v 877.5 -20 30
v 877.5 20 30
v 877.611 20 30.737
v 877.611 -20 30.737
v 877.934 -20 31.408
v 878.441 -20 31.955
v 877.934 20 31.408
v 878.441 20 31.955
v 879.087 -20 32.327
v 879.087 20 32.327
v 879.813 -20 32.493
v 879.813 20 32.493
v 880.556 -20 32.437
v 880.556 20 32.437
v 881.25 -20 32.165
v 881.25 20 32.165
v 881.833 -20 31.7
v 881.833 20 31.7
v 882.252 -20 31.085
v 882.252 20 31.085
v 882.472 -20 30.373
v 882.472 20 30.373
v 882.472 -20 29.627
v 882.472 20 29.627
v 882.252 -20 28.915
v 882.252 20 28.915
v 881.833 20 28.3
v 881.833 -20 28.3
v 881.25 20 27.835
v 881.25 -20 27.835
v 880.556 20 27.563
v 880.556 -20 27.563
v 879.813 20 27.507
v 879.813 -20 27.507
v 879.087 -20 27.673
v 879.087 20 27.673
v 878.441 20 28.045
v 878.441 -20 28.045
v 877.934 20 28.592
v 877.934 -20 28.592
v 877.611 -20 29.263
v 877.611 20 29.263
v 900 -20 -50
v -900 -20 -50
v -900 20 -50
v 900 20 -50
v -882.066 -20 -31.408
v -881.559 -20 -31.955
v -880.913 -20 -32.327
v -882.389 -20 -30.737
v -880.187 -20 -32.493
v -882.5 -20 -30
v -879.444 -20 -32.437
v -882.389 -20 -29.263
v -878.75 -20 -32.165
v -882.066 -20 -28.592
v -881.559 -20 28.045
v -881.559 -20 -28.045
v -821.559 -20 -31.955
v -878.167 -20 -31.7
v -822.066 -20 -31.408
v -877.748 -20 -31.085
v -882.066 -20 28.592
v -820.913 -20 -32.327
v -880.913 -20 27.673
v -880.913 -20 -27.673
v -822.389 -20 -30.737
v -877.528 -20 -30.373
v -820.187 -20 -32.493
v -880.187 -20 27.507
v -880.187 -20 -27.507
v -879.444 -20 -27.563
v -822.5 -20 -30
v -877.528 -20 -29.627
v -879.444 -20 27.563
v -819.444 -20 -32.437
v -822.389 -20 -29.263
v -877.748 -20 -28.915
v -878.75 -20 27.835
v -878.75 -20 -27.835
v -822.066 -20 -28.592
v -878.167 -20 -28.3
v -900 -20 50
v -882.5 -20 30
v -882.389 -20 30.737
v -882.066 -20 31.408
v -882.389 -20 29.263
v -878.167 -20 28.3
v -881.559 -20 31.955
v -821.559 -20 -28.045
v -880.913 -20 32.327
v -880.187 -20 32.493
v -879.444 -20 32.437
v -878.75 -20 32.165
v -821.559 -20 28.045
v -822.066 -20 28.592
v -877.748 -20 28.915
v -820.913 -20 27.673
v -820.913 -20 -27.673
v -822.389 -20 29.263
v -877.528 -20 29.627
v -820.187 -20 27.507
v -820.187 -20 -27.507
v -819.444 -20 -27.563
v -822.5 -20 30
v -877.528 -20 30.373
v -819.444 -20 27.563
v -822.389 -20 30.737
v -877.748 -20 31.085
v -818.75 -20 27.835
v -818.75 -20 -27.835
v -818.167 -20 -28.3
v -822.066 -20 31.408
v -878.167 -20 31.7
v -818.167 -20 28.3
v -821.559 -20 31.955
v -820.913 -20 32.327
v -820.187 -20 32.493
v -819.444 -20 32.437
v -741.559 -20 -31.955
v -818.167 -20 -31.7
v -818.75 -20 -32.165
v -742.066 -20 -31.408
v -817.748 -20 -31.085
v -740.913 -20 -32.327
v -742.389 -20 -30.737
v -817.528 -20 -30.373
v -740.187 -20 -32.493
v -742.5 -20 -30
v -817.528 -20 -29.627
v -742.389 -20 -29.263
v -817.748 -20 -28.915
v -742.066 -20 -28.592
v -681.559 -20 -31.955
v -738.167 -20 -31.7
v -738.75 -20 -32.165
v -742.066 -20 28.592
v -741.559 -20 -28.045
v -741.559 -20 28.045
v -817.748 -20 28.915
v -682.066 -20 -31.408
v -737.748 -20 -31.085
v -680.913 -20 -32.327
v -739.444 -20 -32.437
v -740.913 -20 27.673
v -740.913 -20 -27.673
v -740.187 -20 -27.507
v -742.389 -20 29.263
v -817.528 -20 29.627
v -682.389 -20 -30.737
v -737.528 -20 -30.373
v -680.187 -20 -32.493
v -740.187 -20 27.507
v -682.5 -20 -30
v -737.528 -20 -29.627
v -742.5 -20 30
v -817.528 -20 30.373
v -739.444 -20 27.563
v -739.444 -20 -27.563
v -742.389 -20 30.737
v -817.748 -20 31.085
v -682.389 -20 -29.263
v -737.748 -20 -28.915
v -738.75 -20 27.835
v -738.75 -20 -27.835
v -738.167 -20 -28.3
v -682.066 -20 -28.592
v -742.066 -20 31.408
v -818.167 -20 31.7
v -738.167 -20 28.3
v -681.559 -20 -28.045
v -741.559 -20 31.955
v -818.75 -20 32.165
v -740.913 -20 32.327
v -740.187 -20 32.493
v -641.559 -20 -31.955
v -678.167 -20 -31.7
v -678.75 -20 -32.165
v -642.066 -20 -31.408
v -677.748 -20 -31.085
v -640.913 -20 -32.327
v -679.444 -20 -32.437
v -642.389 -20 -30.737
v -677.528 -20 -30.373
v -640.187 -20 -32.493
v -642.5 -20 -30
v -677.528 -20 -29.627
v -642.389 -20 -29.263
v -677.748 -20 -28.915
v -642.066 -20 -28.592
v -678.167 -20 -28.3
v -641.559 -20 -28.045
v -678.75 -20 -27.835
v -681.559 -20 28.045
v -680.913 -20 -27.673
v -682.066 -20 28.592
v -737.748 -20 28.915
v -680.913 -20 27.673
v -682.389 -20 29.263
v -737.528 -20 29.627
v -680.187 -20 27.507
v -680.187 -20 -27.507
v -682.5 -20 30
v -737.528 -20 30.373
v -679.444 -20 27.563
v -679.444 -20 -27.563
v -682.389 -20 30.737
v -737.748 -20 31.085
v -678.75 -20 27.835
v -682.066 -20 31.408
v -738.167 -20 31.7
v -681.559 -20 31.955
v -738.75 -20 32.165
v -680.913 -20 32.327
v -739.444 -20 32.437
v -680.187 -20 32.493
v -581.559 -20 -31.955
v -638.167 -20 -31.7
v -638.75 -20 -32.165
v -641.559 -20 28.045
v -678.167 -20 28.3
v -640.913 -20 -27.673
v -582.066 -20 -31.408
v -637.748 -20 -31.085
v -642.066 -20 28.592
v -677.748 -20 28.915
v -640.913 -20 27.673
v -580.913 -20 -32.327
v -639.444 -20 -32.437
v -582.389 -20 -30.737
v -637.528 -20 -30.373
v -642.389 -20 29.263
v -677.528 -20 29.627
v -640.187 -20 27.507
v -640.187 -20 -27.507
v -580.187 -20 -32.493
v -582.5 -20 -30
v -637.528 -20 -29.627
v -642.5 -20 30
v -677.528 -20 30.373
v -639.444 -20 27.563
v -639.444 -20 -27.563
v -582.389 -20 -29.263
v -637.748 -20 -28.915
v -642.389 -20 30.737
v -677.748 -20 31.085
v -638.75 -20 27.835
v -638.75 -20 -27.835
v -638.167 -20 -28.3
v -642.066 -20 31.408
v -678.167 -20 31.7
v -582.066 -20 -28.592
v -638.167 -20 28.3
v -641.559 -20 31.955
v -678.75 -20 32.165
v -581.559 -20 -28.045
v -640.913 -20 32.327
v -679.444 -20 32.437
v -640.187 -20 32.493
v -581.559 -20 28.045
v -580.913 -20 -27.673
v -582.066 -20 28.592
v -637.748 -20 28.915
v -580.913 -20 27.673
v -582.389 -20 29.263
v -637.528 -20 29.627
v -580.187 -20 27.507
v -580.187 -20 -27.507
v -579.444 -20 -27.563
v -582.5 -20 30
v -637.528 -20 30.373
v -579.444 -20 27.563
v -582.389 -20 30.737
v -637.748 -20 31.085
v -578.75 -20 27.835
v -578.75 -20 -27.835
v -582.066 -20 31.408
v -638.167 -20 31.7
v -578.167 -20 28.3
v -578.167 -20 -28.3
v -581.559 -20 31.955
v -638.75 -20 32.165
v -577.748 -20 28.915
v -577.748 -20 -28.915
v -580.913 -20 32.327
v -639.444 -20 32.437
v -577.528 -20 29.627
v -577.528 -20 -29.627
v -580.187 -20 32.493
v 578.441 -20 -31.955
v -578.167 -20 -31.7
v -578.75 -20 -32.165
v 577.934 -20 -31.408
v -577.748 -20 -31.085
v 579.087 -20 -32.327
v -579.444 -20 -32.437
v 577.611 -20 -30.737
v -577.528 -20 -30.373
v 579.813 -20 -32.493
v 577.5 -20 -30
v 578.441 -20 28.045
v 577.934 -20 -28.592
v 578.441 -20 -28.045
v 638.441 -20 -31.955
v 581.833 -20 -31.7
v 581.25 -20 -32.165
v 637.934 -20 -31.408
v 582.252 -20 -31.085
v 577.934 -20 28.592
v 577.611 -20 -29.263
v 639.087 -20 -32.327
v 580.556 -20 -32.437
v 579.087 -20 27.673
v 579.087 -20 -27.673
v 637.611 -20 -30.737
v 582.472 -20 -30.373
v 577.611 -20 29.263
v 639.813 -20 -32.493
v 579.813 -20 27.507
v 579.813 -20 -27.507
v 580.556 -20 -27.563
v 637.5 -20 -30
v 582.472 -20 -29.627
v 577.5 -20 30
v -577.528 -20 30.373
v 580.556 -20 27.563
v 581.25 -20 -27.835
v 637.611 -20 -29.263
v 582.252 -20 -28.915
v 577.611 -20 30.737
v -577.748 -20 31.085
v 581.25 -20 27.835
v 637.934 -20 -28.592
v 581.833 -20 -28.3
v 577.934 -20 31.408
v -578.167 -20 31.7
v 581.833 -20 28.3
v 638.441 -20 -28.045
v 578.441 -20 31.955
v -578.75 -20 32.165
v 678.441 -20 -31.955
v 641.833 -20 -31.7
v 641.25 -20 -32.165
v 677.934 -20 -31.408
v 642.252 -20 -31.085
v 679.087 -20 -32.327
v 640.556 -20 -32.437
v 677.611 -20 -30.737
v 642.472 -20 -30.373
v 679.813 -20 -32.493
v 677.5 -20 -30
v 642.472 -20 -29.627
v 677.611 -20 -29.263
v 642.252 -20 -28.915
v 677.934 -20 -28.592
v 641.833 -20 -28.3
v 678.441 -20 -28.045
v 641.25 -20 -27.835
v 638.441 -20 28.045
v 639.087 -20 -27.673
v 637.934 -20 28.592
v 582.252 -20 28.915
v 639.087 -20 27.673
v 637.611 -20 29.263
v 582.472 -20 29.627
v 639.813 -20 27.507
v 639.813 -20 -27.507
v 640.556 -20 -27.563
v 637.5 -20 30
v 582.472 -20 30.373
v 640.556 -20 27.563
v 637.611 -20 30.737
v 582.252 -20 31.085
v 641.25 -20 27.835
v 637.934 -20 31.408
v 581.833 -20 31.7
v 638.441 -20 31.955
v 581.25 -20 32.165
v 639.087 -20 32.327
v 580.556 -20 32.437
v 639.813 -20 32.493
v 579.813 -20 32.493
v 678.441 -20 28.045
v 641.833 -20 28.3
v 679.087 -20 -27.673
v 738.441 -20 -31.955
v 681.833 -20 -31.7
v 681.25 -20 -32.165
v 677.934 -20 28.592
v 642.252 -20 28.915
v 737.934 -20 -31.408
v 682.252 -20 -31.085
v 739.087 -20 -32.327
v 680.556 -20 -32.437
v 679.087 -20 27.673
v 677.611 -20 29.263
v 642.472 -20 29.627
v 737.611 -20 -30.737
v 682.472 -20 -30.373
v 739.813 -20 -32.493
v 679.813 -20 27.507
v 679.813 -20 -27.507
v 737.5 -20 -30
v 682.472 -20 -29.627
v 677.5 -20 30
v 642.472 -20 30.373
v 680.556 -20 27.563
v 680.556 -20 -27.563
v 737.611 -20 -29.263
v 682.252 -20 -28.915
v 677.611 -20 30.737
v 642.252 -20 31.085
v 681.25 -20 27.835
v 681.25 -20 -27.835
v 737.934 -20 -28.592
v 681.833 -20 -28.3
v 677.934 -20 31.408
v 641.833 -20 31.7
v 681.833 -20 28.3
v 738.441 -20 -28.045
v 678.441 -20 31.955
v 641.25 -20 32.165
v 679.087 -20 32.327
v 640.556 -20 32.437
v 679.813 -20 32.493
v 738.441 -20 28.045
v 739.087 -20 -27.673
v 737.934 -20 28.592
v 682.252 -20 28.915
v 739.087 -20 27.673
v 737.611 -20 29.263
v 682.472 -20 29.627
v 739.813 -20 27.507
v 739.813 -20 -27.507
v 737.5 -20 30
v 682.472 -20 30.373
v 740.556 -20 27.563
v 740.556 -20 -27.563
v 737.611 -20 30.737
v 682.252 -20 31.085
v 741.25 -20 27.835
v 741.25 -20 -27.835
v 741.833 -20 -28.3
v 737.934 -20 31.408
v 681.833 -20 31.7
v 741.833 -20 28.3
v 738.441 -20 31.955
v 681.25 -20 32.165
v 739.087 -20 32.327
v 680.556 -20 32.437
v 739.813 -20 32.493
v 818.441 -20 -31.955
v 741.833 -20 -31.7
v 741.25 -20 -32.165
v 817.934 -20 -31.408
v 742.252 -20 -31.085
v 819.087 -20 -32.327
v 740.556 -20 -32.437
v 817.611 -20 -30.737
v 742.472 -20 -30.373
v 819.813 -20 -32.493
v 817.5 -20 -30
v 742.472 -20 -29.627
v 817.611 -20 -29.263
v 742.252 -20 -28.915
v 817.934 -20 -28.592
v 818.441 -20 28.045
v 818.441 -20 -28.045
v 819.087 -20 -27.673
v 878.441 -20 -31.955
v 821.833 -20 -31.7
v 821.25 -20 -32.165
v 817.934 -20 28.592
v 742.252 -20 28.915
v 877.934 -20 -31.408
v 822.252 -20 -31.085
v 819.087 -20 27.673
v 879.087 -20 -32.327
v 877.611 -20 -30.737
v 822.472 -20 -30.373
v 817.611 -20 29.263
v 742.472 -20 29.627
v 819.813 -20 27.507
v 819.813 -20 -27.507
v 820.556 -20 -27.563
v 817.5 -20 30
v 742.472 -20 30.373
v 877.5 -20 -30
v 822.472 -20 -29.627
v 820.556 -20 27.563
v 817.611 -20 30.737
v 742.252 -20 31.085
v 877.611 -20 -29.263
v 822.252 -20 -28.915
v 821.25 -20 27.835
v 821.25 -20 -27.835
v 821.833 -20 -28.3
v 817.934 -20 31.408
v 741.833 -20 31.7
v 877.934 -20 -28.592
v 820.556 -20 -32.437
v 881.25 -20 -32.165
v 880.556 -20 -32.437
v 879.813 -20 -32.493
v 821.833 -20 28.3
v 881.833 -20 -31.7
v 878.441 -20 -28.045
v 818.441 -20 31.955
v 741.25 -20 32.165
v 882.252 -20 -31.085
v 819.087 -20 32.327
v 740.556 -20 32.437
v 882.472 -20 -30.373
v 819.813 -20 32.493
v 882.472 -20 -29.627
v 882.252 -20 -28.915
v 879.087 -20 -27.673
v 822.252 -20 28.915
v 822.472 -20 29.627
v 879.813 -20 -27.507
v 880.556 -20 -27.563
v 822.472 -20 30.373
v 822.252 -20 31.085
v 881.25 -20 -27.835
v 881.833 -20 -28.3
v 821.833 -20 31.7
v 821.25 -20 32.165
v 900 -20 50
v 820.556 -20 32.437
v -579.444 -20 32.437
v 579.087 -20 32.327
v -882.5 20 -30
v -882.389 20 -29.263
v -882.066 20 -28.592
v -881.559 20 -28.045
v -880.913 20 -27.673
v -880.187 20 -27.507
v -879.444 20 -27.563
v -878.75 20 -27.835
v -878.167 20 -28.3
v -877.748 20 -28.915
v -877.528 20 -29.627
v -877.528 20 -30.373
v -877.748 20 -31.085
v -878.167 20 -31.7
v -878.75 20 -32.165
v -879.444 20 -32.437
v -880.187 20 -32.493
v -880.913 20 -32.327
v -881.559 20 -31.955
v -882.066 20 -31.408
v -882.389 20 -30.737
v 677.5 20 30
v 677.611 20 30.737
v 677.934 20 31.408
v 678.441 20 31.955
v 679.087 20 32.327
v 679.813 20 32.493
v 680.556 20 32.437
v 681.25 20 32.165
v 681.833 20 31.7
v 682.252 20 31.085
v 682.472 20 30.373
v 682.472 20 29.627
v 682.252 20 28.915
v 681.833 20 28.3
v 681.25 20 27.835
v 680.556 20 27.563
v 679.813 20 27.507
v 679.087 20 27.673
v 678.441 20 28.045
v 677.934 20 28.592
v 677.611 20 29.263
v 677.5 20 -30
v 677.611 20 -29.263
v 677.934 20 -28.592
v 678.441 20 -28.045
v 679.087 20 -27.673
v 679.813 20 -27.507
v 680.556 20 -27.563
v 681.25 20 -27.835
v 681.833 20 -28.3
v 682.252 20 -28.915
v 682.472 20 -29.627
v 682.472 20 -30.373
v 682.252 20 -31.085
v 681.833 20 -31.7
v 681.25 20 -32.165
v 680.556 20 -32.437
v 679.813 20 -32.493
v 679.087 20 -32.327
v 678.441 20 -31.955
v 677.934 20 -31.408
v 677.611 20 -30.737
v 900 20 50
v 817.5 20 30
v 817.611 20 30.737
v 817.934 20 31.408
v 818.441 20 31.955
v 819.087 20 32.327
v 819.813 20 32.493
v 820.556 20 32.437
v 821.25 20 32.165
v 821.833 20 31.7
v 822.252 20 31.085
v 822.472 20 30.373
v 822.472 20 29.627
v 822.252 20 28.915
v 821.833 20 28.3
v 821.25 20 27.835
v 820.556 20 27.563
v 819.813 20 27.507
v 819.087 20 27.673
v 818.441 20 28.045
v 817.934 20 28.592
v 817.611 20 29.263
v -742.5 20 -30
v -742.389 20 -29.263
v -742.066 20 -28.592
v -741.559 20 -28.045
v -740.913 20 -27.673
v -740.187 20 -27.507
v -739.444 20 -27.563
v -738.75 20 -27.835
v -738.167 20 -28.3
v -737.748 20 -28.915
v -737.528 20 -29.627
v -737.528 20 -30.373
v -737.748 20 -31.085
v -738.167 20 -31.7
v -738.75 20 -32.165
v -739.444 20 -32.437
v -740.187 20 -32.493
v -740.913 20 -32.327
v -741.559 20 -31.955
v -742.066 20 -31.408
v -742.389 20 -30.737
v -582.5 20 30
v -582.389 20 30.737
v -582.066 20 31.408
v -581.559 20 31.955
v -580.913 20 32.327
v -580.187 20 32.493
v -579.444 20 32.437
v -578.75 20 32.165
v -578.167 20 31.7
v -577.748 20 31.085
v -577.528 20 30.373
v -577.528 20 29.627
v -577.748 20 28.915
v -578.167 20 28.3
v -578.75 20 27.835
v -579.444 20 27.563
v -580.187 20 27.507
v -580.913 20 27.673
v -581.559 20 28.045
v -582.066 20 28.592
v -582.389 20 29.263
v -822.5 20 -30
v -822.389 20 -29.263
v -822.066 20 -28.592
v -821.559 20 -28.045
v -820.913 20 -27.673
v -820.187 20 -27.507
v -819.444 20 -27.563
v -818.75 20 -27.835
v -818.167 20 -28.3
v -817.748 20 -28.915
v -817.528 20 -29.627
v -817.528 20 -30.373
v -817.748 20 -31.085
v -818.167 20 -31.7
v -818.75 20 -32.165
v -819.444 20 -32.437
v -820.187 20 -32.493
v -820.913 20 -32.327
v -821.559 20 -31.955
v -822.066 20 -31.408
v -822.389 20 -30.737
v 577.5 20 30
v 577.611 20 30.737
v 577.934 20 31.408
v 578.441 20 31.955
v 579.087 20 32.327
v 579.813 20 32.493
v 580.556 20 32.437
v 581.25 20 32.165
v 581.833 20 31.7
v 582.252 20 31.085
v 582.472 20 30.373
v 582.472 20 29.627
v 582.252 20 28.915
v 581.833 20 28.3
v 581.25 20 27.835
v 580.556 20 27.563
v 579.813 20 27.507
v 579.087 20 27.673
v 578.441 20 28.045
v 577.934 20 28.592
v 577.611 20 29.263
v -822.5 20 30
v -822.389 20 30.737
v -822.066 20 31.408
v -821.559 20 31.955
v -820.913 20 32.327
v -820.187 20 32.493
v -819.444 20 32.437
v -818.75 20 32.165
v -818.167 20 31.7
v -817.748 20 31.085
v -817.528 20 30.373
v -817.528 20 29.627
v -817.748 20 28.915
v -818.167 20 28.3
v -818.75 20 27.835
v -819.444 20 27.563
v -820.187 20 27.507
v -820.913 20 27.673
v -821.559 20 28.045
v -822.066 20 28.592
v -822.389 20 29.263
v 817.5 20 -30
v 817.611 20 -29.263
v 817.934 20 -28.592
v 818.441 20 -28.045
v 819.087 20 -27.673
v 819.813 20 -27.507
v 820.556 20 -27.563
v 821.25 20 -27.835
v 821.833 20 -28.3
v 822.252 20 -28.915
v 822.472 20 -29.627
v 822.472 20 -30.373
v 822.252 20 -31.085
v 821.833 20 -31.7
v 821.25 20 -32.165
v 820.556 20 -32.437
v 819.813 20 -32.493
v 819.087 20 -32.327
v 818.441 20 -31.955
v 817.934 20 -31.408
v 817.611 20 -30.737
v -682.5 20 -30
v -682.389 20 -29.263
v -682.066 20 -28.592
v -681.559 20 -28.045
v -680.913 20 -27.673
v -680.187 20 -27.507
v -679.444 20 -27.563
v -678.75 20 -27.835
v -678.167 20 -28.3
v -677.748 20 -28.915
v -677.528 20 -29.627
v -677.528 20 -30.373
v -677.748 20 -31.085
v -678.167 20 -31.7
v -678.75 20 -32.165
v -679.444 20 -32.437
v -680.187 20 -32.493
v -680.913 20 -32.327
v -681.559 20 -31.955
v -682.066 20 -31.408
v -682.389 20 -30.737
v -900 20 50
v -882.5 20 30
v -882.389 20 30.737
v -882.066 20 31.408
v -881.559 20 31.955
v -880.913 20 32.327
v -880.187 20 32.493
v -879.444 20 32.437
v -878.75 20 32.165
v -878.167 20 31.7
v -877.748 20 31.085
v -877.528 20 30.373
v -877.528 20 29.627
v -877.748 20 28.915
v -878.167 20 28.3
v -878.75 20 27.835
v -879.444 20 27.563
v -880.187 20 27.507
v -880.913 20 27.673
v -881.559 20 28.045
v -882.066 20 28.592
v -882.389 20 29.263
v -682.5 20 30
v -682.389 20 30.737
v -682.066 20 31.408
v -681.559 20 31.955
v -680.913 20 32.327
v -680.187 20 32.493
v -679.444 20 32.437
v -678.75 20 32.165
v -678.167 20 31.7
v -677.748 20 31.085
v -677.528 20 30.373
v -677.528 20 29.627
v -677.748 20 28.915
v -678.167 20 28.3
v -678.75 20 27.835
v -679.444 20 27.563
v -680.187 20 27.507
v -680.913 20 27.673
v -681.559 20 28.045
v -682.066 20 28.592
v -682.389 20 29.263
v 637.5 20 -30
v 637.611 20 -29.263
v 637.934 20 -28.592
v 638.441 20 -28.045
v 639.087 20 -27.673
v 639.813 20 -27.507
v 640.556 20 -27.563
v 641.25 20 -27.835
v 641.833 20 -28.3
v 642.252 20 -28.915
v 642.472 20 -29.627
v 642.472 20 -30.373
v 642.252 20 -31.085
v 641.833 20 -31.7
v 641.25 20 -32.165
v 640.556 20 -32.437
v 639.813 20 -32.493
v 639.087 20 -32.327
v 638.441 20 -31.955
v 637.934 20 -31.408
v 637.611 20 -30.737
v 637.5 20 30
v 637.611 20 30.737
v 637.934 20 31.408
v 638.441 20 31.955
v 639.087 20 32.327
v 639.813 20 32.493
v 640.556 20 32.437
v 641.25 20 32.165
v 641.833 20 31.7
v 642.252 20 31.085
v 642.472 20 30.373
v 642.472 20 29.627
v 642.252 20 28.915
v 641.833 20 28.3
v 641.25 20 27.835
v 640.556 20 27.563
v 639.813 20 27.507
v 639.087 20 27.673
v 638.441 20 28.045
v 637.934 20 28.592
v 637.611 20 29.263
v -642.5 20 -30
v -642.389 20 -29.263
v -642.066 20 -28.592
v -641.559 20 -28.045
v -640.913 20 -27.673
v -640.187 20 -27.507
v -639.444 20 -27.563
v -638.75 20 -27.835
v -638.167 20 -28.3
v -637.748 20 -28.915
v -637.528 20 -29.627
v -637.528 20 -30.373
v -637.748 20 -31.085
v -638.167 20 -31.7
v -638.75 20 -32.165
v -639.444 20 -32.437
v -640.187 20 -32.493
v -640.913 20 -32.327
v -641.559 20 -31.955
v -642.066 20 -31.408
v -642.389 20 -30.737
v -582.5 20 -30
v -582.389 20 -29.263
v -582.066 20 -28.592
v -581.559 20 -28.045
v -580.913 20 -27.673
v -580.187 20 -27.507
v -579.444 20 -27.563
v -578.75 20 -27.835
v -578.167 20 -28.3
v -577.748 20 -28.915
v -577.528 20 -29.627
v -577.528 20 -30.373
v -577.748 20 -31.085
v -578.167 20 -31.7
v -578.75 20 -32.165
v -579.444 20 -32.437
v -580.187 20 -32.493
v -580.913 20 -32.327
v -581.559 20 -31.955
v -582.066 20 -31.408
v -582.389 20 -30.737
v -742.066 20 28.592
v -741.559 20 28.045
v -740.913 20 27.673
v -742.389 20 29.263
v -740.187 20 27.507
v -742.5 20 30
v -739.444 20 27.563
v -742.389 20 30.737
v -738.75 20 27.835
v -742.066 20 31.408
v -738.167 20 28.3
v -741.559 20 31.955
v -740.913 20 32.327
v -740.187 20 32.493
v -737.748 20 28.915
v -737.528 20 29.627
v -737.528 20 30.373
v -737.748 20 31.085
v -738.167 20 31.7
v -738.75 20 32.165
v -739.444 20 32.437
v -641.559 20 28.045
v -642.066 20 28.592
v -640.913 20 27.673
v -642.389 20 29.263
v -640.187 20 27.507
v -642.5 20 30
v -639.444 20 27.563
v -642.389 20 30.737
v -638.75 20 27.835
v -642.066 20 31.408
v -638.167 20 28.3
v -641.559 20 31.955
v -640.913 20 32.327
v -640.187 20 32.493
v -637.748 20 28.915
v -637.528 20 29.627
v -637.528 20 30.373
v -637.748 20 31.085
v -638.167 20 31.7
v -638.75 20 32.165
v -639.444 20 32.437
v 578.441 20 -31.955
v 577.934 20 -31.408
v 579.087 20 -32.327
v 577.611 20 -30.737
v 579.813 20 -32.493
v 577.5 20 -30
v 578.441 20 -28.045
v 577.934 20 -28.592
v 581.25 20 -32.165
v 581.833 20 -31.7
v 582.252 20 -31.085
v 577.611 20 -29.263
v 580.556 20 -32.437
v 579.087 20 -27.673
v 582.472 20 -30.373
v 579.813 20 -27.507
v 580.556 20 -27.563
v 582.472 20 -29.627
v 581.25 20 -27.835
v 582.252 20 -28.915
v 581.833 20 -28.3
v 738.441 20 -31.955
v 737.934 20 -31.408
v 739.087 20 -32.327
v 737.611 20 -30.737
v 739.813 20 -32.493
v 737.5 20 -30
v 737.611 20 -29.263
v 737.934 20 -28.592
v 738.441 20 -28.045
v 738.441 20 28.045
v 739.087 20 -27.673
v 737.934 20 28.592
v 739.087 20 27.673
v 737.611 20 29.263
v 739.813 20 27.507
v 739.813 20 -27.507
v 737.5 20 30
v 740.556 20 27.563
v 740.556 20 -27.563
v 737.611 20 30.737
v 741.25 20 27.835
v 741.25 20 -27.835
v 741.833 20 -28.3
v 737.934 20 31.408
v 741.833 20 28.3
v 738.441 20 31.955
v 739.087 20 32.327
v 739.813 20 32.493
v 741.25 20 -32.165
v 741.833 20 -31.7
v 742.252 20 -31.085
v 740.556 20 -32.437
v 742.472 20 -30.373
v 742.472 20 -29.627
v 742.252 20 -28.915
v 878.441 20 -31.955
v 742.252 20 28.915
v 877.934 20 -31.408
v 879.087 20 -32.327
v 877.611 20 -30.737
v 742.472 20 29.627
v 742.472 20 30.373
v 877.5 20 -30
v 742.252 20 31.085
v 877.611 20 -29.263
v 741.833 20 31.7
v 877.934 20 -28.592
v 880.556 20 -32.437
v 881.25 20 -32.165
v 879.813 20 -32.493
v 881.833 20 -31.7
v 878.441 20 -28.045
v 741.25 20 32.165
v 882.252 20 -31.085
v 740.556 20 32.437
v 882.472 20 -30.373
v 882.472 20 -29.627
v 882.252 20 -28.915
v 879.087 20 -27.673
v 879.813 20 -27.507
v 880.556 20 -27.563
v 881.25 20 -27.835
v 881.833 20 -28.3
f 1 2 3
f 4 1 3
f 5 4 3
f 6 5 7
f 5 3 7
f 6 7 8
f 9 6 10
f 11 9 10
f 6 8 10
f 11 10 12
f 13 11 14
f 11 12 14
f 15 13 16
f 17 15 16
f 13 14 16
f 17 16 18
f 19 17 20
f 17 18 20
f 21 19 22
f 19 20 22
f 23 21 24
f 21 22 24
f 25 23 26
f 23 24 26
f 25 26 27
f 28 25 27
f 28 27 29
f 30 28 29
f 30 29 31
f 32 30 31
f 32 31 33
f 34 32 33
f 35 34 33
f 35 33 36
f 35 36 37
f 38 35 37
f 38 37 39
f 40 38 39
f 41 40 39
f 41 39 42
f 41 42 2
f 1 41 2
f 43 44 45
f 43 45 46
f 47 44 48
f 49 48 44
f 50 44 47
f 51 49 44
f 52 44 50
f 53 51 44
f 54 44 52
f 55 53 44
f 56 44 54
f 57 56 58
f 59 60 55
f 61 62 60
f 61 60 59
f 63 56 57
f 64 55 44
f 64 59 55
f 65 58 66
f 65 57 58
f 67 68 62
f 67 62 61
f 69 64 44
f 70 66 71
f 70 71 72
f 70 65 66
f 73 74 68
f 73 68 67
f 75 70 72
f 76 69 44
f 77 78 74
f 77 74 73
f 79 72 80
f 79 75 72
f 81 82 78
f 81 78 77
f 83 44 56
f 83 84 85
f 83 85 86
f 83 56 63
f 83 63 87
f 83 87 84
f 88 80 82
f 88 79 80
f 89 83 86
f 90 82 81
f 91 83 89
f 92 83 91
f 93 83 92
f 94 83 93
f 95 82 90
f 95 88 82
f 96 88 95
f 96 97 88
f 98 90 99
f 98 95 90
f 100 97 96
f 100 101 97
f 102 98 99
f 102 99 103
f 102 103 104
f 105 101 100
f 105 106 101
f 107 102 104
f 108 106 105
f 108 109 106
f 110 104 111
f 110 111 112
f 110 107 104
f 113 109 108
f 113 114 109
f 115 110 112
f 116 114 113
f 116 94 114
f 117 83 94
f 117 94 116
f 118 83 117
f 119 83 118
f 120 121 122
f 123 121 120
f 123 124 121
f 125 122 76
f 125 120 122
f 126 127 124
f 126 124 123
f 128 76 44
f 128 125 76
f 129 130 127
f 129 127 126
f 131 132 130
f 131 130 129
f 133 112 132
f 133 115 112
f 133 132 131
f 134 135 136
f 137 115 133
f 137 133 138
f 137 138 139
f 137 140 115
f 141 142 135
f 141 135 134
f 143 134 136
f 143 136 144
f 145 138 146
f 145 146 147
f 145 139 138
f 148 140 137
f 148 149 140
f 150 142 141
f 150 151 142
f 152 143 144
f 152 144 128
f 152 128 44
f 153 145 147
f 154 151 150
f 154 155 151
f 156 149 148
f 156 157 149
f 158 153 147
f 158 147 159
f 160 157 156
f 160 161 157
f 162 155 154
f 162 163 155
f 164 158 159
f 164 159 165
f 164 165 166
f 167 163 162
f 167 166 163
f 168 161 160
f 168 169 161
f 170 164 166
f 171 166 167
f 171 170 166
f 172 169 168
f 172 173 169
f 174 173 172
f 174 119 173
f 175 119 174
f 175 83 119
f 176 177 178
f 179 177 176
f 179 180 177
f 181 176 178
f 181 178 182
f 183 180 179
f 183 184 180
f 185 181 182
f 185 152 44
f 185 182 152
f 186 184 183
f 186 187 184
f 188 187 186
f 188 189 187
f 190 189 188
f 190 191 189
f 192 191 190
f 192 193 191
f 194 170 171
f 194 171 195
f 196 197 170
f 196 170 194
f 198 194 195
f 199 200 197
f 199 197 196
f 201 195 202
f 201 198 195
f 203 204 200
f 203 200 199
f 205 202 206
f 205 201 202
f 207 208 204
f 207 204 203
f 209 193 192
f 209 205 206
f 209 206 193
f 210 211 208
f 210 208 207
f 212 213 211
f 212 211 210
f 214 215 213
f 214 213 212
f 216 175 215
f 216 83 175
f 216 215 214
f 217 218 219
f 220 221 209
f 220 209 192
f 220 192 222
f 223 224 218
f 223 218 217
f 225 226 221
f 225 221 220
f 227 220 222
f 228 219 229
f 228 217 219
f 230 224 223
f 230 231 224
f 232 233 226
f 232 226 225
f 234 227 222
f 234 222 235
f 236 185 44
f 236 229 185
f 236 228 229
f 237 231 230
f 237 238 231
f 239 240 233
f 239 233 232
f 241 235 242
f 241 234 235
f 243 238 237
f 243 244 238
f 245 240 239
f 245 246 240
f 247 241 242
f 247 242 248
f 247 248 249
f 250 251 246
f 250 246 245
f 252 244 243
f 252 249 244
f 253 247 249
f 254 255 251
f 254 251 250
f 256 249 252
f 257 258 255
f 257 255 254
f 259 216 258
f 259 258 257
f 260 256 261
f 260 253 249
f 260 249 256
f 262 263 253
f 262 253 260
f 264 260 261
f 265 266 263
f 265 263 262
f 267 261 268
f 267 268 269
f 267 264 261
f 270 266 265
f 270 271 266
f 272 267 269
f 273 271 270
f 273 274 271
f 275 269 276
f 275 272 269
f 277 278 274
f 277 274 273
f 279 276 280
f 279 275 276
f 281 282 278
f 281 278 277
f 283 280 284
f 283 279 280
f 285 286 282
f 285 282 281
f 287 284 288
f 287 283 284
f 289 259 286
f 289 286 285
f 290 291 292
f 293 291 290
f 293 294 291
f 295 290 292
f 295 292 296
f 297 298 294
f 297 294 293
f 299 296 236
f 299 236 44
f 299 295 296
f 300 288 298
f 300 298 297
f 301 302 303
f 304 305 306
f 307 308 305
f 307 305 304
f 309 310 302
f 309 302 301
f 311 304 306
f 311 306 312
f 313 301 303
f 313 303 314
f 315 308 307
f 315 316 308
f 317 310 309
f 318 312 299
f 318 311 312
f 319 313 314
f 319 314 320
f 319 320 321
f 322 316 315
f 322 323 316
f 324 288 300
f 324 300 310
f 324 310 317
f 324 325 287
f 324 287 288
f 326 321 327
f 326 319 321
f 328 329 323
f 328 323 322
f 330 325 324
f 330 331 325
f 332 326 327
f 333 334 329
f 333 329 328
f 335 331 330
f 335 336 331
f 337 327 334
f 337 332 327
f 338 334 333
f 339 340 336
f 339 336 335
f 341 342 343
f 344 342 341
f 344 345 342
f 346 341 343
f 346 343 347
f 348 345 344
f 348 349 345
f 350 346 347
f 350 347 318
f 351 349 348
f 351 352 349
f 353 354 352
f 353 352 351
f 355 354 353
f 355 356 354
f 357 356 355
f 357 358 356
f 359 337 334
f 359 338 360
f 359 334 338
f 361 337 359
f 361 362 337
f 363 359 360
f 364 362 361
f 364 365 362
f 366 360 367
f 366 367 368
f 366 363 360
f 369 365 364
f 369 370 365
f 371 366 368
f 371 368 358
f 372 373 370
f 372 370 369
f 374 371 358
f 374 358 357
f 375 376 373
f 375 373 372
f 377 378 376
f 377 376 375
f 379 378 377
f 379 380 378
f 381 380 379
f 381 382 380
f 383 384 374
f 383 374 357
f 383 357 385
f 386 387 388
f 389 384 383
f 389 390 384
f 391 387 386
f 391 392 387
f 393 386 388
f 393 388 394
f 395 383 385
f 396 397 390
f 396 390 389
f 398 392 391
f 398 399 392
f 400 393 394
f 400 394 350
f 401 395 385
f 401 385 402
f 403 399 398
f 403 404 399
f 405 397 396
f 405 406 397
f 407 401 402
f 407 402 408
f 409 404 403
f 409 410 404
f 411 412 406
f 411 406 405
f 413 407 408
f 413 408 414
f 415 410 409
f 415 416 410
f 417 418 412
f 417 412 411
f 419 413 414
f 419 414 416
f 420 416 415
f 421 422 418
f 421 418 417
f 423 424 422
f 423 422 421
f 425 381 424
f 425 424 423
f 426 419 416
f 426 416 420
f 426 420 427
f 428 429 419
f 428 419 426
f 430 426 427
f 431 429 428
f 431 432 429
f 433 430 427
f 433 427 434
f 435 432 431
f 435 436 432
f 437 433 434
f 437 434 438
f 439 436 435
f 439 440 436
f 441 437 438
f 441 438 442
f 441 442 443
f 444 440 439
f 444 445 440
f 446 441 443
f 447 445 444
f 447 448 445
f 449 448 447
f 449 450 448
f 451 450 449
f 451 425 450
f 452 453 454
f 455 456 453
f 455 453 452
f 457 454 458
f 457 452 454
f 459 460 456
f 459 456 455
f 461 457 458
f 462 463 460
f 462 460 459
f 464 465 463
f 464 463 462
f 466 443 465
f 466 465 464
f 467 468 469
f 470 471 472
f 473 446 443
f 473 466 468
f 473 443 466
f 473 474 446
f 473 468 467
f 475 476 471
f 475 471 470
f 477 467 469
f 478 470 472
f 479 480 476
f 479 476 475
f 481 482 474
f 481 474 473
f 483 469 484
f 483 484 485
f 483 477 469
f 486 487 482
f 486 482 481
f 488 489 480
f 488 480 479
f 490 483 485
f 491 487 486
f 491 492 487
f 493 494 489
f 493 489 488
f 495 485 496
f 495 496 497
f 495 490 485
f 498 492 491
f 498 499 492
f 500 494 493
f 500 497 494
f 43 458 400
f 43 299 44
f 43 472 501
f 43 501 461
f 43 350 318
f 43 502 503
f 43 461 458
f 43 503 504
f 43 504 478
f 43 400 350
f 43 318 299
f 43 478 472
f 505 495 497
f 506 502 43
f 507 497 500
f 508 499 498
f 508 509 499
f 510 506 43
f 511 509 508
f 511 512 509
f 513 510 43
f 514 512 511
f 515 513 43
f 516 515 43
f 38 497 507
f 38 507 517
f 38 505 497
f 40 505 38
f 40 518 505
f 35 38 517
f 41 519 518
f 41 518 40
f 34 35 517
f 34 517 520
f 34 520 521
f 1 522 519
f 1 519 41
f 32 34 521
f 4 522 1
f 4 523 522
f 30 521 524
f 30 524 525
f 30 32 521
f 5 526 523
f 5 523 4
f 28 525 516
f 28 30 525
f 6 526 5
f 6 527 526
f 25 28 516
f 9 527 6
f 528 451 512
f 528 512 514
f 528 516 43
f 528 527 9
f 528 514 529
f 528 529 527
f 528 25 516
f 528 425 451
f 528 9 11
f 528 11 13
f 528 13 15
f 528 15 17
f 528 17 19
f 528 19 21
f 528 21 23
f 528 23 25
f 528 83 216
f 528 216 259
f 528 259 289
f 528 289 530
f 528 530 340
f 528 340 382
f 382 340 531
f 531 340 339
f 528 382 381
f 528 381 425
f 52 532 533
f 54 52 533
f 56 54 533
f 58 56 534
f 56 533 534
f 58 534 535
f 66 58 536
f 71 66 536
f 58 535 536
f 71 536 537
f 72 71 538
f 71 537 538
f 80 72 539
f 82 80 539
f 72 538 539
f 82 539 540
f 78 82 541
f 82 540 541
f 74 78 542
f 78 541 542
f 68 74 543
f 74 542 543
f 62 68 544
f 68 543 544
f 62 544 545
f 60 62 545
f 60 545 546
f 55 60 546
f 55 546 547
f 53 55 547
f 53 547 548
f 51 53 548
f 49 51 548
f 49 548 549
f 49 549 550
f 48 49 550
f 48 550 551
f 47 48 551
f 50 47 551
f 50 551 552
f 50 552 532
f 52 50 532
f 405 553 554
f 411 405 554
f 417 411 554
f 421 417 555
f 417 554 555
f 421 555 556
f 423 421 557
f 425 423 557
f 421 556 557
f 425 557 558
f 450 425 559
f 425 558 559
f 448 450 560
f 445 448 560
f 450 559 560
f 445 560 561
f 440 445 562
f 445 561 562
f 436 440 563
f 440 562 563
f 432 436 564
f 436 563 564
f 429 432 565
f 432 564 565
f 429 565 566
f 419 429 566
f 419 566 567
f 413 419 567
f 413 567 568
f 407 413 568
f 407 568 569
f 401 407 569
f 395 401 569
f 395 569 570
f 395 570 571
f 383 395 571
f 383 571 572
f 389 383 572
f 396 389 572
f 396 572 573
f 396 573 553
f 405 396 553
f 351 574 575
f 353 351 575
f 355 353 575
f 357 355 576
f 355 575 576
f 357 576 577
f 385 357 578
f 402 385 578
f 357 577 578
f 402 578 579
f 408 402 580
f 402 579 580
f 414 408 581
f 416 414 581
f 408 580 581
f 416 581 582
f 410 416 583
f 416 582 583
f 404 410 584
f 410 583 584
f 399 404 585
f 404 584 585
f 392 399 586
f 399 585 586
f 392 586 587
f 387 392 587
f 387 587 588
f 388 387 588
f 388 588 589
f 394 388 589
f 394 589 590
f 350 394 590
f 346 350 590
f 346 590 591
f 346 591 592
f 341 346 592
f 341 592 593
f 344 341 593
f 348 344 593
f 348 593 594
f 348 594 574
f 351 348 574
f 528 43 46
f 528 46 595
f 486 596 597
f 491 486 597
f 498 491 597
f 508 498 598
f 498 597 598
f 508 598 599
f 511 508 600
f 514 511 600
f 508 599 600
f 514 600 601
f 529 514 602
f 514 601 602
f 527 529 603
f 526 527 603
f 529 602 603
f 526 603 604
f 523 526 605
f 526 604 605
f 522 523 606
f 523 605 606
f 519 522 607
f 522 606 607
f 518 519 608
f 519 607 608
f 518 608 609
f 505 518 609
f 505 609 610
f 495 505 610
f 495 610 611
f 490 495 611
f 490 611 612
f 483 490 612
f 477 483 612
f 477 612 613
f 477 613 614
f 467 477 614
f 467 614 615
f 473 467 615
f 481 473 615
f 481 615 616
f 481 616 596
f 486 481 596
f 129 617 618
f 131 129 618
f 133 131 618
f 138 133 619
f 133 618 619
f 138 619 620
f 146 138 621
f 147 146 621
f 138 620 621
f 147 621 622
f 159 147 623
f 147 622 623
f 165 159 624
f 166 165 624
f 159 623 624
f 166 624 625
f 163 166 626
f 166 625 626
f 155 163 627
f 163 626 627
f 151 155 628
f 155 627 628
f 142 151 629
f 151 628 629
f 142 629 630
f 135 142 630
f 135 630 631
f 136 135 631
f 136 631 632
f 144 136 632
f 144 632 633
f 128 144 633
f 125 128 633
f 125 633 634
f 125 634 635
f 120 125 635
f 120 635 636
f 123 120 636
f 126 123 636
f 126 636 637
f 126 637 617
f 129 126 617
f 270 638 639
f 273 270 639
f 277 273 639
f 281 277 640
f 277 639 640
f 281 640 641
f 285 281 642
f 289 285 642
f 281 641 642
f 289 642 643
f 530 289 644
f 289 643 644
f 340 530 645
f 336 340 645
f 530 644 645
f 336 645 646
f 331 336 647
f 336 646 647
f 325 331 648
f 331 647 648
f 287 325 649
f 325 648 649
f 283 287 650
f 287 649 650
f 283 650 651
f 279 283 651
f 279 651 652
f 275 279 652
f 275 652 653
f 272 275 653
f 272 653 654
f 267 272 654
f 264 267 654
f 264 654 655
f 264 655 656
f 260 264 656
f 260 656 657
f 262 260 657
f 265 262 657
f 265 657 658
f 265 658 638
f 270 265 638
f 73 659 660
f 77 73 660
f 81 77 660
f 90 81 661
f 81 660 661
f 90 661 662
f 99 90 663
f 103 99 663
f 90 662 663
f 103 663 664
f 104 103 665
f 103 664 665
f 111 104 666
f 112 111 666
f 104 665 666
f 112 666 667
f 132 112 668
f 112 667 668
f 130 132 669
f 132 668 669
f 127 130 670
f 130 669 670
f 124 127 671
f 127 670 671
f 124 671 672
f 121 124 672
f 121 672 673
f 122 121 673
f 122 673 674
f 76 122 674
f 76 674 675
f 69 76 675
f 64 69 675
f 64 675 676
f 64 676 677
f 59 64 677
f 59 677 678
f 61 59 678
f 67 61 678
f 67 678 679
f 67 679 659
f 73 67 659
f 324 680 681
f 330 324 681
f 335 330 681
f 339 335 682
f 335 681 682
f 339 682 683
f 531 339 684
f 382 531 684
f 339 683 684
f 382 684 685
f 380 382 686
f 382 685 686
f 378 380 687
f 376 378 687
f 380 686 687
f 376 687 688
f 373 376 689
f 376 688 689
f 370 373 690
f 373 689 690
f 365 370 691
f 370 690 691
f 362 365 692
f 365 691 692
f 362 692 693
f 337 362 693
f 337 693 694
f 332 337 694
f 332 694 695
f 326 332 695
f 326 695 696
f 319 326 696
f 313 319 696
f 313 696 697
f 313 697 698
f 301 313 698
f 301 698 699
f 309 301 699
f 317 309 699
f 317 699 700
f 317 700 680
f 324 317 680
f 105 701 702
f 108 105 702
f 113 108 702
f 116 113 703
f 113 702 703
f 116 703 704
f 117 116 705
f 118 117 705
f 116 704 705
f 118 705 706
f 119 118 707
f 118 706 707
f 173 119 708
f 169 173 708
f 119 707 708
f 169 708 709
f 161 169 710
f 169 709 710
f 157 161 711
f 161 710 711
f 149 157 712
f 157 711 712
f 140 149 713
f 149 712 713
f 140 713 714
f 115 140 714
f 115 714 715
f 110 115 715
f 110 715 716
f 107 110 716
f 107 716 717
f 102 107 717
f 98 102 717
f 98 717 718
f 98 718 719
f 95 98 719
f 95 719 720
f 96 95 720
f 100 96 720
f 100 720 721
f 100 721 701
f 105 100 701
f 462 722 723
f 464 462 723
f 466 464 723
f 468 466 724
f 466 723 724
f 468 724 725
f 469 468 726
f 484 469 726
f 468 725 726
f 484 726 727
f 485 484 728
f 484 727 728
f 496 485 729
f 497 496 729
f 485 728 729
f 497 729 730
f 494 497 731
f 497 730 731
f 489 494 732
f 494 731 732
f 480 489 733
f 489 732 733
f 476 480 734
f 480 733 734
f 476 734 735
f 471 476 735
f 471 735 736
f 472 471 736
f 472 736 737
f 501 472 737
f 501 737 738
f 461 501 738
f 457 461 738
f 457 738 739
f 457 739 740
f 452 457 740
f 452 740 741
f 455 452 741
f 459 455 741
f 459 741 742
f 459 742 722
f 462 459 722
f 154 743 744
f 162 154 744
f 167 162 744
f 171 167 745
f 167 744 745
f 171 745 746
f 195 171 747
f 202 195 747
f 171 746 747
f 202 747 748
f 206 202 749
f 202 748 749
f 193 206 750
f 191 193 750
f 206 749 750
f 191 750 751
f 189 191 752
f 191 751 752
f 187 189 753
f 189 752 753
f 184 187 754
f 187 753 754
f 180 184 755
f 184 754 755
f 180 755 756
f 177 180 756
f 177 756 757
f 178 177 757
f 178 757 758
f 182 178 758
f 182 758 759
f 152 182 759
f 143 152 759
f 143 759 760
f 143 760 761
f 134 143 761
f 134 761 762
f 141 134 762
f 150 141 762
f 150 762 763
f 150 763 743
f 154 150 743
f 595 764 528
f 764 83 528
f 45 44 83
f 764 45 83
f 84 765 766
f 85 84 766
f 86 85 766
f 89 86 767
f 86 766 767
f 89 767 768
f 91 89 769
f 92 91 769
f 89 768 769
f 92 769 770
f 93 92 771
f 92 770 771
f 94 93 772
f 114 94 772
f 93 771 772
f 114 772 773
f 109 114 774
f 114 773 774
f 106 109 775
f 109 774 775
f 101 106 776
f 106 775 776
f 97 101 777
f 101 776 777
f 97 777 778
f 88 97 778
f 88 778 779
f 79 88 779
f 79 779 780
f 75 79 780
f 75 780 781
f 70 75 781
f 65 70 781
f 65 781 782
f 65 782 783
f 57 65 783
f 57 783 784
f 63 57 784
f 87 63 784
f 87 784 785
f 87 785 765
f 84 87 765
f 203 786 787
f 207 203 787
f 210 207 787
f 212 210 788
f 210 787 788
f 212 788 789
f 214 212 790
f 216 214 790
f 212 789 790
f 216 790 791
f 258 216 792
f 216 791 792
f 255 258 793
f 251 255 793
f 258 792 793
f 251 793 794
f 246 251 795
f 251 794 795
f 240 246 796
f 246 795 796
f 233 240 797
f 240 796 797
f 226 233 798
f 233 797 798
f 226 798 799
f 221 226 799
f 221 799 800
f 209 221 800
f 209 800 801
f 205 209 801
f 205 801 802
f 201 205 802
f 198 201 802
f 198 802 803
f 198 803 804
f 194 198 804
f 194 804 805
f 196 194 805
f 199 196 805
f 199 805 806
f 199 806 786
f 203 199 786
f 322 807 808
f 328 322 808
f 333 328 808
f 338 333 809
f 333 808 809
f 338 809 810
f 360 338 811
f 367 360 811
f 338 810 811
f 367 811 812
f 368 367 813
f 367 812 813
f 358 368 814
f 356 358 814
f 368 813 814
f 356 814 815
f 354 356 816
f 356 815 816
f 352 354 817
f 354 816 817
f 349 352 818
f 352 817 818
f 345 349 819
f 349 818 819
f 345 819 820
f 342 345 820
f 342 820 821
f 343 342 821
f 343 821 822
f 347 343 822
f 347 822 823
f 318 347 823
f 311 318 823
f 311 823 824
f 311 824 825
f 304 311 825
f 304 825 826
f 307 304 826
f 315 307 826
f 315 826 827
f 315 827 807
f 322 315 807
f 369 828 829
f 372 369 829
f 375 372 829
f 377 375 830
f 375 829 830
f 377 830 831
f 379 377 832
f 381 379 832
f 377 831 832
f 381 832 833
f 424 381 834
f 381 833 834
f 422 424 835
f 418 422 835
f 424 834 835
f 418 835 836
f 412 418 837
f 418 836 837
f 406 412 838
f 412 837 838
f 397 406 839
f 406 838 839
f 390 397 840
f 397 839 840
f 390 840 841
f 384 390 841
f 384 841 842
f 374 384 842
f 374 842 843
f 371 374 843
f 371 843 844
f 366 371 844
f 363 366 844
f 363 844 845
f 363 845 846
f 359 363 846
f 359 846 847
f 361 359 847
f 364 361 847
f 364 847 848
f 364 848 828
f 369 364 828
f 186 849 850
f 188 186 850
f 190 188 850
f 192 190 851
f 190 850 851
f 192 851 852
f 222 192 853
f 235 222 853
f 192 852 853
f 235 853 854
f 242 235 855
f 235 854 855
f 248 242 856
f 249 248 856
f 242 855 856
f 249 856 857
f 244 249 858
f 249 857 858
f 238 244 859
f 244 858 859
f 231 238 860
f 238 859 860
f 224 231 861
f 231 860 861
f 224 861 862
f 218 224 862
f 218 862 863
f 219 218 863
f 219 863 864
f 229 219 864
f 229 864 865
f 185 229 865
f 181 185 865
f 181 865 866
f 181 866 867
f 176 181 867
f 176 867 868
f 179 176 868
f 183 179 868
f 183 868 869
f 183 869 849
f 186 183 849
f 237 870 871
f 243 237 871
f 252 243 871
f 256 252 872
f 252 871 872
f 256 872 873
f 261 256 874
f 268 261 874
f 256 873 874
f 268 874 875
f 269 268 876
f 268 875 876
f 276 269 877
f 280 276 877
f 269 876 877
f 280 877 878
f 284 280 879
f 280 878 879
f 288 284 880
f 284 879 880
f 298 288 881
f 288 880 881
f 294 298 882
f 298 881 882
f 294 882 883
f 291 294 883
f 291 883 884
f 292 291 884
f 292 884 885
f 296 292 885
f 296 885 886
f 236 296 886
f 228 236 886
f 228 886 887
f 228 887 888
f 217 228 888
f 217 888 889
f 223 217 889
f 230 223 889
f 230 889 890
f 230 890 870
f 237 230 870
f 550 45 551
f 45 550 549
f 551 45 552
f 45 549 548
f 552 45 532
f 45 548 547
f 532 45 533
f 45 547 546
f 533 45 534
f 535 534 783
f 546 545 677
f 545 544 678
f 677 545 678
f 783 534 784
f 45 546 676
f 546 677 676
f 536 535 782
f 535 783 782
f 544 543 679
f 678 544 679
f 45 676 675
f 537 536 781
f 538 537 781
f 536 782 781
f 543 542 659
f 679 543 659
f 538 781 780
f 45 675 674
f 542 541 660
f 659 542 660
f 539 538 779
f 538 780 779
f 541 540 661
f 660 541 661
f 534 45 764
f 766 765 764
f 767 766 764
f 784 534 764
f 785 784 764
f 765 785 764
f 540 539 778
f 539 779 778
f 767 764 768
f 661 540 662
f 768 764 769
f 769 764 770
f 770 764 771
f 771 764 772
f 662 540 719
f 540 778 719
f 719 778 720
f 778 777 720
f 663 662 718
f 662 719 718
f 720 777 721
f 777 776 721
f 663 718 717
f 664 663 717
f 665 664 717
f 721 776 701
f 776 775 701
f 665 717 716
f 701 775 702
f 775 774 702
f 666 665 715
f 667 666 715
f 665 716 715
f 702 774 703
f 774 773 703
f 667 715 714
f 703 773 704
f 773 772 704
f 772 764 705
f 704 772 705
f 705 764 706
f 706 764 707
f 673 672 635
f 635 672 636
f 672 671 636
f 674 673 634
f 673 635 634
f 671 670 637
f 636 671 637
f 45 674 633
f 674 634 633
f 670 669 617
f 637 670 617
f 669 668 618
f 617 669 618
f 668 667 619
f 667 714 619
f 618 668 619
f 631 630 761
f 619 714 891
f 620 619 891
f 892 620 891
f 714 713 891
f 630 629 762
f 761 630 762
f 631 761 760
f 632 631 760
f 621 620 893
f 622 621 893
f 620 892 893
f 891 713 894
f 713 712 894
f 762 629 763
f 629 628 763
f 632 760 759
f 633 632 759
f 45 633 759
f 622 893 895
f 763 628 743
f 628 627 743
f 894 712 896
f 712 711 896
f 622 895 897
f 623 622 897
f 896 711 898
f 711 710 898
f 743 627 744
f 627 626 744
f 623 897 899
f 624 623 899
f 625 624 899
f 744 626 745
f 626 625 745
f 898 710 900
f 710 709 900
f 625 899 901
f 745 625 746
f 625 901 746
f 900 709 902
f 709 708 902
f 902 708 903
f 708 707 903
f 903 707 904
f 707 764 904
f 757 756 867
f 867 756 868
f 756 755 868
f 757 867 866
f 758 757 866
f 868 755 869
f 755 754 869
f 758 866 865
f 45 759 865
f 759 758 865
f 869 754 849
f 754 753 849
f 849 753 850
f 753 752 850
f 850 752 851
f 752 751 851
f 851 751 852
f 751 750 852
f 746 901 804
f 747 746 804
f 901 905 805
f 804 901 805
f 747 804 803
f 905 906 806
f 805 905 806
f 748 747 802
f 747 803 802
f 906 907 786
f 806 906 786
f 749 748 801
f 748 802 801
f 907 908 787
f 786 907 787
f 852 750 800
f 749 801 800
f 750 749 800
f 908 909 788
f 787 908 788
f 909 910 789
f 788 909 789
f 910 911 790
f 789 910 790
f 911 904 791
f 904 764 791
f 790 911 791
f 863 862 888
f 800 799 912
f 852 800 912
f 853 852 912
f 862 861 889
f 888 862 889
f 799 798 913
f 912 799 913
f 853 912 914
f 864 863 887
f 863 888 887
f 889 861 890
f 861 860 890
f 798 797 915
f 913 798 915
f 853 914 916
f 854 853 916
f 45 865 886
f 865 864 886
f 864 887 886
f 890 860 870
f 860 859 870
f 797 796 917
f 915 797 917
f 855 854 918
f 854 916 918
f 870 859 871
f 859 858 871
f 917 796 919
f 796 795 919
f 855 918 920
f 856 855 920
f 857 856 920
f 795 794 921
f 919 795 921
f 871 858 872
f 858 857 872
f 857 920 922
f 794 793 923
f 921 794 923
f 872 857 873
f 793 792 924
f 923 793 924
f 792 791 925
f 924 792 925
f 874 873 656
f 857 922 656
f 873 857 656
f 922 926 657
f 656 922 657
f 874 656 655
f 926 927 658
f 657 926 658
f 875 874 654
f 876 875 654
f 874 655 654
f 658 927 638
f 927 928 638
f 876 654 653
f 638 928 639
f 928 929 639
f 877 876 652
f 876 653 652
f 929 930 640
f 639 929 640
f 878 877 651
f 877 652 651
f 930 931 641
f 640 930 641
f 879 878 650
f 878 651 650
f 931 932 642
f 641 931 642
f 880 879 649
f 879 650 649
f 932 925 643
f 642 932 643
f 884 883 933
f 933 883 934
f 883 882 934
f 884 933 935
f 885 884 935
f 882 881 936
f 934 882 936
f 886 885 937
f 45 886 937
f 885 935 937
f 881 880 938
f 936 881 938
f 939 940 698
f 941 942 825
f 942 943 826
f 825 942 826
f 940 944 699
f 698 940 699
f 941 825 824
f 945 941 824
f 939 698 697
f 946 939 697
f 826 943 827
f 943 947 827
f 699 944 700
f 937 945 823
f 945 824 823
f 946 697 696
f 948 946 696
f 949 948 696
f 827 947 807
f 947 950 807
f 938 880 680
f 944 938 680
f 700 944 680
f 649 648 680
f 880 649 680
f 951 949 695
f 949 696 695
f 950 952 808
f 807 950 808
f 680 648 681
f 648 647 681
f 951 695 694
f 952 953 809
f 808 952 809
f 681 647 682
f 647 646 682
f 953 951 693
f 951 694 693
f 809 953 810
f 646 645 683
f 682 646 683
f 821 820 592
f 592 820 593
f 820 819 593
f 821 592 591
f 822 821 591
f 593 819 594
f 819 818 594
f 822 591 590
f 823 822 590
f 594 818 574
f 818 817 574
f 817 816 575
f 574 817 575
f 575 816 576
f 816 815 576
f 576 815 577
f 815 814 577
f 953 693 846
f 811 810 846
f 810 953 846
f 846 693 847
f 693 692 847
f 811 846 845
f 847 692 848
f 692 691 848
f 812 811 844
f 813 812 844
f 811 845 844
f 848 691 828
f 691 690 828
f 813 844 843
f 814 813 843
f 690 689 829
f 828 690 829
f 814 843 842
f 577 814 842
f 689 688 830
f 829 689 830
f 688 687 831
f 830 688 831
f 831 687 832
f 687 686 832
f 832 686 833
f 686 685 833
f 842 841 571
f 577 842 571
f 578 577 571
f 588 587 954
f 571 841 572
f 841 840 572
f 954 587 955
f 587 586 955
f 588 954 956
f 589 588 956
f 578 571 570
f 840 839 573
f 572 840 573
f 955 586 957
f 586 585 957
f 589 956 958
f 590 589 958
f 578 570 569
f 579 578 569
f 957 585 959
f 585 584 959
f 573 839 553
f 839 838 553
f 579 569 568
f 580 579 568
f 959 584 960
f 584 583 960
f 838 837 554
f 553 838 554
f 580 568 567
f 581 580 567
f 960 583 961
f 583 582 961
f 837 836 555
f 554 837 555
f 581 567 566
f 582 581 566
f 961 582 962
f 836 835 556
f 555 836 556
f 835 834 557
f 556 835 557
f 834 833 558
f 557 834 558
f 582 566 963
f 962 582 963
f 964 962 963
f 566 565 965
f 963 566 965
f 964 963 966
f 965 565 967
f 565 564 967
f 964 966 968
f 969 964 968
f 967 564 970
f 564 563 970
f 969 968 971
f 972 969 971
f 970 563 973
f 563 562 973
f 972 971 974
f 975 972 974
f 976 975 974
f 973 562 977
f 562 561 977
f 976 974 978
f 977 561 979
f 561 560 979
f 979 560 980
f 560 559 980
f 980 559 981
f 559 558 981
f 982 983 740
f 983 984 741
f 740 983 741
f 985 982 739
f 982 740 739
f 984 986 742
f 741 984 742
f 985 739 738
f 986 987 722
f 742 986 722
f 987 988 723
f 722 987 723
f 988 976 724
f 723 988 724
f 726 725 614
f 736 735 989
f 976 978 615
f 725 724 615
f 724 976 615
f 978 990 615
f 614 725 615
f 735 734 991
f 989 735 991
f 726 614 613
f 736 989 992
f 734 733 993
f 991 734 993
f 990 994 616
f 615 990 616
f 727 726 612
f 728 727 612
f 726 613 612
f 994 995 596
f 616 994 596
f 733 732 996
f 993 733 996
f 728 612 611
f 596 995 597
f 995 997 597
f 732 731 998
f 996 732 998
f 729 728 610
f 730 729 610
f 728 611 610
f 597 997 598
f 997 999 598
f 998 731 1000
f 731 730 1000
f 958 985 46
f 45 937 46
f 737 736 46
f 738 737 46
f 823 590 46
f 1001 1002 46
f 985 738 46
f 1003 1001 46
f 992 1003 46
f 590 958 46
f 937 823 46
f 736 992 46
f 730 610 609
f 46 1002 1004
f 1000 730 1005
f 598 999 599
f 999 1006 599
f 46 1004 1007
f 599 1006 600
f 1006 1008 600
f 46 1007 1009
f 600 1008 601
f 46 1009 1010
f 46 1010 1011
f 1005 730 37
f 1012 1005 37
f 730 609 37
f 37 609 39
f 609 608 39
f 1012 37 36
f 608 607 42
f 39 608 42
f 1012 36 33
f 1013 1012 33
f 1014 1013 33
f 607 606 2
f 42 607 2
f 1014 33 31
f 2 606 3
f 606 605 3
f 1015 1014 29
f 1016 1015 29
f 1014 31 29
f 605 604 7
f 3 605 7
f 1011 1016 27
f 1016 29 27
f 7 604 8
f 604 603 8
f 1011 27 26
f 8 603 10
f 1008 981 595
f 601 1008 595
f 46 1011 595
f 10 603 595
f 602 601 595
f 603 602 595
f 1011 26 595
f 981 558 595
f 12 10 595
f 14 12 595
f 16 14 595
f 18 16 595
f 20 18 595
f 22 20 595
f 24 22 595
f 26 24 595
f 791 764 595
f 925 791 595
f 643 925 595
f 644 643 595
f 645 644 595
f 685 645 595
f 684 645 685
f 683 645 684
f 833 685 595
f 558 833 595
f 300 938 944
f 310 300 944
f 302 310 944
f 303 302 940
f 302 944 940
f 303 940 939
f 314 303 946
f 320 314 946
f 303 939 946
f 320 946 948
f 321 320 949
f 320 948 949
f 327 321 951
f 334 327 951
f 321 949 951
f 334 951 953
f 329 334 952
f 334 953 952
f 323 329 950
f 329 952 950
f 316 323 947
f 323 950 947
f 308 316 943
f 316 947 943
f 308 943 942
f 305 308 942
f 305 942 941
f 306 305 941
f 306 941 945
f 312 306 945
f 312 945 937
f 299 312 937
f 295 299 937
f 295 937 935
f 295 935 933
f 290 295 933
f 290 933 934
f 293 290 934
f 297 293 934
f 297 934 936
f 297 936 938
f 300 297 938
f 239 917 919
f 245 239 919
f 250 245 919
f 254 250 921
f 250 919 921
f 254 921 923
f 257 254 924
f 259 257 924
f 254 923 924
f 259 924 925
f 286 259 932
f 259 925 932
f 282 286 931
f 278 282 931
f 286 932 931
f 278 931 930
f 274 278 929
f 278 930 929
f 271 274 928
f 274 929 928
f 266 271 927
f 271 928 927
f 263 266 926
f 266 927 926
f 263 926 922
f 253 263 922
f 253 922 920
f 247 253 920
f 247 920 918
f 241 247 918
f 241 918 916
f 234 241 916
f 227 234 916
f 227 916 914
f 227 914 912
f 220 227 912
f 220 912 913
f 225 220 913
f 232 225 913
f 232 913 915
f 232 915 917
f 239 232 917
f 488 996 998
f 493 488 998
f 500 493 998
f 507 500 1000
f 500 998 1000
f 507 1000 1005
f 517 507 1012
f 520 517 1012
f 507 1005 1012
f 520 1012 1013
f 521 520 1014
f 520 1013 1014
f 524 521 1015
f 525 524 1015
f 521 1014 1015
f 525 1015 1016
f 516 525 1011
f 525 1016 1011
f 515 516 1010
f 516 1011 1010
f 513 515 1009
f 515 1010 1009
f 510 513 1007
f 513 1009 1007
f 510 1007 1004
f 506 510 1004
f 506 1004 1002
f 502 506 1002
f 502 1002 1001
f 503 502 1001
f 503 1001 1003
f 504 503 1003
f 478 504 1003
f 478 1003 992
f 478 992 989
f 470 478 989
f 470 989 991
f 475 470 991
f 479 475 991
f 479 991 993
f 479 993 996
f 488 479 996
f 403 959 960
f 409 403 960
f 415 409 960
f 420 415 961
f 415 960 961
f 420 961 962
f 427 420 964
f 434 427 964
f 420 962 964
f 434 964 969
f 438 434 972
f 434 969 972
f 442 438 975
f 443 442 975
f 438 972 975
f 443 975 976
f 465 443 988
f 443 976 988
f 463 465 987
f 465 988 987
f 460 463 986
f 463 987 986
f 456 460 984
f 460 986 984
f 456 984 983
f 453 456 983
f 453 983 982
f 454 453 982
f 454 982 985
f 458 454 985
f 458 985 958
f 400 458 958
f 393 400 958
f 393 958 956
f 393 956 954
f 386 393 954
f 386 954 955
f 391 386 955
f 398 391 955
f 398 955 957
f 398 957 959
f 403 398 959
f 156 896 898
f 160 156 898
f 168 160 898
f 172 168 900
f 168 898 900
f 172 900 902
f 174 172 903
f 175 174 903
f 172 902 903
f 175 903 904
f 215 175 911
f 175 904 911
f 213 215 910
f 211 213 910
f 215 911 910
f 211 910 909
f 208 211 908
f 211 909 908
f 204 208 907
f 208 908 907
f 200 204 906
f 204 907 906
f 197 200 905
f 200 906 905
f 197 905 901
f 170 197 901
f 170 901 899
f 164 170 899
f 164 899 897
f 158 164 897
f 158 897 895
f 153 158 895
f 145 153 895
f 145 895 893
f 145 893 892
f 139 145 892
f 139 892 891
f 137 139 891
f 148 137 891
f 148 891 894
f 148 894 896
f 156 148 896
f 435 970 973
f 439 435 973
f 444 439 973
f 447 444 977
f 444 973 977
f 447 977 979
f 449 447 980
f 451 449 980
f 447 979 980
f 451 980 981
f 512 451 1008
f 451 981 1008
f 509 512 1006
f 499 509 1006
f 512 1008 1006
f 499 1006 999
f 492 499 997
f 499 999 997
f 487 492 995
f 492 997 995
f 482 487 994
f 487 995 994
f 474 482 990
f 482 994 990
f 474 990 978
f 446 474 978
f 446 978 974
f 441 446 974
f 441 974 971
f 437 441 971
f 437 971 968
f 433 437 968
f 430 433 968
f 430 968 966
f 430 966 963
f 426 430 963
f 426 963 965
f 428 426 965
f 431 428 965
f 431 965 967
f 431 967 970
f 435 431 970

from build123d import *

# Parameters (mm, degrees)
F0_W     = 1800
F0_H     = 100
F1_DEPTH = 20
F3_D     = 5


with BuildPart() as f1:
    # F0 (on Front) → F1 (new body, symmetric)
    with BuildSketch(Plane.XZ):
        Rectangle(F0_W, F0_H)
    extrude(amount=F1_DEPTH, both=True)

    # F3 (through all)
    with Locations(Plane.XZ.offset(20)):
        with Locations((-880, 30), (-880, -30), (-820, 30), (-820, -30), (-740, 30), (-740, -30), (-680, 30), (-680, -30), (680, 30), (680, -30), (740, 30), (740, -30), (820, -30), (880, 30), (880, -30), (820, 30), (-640, 30), (-640, -30), (-580, -30), (-580, 30), (580, 30), (640, 30), (580, -30), (640, -30)):
            Hole(F3_D / 2)


solid = f1.part
